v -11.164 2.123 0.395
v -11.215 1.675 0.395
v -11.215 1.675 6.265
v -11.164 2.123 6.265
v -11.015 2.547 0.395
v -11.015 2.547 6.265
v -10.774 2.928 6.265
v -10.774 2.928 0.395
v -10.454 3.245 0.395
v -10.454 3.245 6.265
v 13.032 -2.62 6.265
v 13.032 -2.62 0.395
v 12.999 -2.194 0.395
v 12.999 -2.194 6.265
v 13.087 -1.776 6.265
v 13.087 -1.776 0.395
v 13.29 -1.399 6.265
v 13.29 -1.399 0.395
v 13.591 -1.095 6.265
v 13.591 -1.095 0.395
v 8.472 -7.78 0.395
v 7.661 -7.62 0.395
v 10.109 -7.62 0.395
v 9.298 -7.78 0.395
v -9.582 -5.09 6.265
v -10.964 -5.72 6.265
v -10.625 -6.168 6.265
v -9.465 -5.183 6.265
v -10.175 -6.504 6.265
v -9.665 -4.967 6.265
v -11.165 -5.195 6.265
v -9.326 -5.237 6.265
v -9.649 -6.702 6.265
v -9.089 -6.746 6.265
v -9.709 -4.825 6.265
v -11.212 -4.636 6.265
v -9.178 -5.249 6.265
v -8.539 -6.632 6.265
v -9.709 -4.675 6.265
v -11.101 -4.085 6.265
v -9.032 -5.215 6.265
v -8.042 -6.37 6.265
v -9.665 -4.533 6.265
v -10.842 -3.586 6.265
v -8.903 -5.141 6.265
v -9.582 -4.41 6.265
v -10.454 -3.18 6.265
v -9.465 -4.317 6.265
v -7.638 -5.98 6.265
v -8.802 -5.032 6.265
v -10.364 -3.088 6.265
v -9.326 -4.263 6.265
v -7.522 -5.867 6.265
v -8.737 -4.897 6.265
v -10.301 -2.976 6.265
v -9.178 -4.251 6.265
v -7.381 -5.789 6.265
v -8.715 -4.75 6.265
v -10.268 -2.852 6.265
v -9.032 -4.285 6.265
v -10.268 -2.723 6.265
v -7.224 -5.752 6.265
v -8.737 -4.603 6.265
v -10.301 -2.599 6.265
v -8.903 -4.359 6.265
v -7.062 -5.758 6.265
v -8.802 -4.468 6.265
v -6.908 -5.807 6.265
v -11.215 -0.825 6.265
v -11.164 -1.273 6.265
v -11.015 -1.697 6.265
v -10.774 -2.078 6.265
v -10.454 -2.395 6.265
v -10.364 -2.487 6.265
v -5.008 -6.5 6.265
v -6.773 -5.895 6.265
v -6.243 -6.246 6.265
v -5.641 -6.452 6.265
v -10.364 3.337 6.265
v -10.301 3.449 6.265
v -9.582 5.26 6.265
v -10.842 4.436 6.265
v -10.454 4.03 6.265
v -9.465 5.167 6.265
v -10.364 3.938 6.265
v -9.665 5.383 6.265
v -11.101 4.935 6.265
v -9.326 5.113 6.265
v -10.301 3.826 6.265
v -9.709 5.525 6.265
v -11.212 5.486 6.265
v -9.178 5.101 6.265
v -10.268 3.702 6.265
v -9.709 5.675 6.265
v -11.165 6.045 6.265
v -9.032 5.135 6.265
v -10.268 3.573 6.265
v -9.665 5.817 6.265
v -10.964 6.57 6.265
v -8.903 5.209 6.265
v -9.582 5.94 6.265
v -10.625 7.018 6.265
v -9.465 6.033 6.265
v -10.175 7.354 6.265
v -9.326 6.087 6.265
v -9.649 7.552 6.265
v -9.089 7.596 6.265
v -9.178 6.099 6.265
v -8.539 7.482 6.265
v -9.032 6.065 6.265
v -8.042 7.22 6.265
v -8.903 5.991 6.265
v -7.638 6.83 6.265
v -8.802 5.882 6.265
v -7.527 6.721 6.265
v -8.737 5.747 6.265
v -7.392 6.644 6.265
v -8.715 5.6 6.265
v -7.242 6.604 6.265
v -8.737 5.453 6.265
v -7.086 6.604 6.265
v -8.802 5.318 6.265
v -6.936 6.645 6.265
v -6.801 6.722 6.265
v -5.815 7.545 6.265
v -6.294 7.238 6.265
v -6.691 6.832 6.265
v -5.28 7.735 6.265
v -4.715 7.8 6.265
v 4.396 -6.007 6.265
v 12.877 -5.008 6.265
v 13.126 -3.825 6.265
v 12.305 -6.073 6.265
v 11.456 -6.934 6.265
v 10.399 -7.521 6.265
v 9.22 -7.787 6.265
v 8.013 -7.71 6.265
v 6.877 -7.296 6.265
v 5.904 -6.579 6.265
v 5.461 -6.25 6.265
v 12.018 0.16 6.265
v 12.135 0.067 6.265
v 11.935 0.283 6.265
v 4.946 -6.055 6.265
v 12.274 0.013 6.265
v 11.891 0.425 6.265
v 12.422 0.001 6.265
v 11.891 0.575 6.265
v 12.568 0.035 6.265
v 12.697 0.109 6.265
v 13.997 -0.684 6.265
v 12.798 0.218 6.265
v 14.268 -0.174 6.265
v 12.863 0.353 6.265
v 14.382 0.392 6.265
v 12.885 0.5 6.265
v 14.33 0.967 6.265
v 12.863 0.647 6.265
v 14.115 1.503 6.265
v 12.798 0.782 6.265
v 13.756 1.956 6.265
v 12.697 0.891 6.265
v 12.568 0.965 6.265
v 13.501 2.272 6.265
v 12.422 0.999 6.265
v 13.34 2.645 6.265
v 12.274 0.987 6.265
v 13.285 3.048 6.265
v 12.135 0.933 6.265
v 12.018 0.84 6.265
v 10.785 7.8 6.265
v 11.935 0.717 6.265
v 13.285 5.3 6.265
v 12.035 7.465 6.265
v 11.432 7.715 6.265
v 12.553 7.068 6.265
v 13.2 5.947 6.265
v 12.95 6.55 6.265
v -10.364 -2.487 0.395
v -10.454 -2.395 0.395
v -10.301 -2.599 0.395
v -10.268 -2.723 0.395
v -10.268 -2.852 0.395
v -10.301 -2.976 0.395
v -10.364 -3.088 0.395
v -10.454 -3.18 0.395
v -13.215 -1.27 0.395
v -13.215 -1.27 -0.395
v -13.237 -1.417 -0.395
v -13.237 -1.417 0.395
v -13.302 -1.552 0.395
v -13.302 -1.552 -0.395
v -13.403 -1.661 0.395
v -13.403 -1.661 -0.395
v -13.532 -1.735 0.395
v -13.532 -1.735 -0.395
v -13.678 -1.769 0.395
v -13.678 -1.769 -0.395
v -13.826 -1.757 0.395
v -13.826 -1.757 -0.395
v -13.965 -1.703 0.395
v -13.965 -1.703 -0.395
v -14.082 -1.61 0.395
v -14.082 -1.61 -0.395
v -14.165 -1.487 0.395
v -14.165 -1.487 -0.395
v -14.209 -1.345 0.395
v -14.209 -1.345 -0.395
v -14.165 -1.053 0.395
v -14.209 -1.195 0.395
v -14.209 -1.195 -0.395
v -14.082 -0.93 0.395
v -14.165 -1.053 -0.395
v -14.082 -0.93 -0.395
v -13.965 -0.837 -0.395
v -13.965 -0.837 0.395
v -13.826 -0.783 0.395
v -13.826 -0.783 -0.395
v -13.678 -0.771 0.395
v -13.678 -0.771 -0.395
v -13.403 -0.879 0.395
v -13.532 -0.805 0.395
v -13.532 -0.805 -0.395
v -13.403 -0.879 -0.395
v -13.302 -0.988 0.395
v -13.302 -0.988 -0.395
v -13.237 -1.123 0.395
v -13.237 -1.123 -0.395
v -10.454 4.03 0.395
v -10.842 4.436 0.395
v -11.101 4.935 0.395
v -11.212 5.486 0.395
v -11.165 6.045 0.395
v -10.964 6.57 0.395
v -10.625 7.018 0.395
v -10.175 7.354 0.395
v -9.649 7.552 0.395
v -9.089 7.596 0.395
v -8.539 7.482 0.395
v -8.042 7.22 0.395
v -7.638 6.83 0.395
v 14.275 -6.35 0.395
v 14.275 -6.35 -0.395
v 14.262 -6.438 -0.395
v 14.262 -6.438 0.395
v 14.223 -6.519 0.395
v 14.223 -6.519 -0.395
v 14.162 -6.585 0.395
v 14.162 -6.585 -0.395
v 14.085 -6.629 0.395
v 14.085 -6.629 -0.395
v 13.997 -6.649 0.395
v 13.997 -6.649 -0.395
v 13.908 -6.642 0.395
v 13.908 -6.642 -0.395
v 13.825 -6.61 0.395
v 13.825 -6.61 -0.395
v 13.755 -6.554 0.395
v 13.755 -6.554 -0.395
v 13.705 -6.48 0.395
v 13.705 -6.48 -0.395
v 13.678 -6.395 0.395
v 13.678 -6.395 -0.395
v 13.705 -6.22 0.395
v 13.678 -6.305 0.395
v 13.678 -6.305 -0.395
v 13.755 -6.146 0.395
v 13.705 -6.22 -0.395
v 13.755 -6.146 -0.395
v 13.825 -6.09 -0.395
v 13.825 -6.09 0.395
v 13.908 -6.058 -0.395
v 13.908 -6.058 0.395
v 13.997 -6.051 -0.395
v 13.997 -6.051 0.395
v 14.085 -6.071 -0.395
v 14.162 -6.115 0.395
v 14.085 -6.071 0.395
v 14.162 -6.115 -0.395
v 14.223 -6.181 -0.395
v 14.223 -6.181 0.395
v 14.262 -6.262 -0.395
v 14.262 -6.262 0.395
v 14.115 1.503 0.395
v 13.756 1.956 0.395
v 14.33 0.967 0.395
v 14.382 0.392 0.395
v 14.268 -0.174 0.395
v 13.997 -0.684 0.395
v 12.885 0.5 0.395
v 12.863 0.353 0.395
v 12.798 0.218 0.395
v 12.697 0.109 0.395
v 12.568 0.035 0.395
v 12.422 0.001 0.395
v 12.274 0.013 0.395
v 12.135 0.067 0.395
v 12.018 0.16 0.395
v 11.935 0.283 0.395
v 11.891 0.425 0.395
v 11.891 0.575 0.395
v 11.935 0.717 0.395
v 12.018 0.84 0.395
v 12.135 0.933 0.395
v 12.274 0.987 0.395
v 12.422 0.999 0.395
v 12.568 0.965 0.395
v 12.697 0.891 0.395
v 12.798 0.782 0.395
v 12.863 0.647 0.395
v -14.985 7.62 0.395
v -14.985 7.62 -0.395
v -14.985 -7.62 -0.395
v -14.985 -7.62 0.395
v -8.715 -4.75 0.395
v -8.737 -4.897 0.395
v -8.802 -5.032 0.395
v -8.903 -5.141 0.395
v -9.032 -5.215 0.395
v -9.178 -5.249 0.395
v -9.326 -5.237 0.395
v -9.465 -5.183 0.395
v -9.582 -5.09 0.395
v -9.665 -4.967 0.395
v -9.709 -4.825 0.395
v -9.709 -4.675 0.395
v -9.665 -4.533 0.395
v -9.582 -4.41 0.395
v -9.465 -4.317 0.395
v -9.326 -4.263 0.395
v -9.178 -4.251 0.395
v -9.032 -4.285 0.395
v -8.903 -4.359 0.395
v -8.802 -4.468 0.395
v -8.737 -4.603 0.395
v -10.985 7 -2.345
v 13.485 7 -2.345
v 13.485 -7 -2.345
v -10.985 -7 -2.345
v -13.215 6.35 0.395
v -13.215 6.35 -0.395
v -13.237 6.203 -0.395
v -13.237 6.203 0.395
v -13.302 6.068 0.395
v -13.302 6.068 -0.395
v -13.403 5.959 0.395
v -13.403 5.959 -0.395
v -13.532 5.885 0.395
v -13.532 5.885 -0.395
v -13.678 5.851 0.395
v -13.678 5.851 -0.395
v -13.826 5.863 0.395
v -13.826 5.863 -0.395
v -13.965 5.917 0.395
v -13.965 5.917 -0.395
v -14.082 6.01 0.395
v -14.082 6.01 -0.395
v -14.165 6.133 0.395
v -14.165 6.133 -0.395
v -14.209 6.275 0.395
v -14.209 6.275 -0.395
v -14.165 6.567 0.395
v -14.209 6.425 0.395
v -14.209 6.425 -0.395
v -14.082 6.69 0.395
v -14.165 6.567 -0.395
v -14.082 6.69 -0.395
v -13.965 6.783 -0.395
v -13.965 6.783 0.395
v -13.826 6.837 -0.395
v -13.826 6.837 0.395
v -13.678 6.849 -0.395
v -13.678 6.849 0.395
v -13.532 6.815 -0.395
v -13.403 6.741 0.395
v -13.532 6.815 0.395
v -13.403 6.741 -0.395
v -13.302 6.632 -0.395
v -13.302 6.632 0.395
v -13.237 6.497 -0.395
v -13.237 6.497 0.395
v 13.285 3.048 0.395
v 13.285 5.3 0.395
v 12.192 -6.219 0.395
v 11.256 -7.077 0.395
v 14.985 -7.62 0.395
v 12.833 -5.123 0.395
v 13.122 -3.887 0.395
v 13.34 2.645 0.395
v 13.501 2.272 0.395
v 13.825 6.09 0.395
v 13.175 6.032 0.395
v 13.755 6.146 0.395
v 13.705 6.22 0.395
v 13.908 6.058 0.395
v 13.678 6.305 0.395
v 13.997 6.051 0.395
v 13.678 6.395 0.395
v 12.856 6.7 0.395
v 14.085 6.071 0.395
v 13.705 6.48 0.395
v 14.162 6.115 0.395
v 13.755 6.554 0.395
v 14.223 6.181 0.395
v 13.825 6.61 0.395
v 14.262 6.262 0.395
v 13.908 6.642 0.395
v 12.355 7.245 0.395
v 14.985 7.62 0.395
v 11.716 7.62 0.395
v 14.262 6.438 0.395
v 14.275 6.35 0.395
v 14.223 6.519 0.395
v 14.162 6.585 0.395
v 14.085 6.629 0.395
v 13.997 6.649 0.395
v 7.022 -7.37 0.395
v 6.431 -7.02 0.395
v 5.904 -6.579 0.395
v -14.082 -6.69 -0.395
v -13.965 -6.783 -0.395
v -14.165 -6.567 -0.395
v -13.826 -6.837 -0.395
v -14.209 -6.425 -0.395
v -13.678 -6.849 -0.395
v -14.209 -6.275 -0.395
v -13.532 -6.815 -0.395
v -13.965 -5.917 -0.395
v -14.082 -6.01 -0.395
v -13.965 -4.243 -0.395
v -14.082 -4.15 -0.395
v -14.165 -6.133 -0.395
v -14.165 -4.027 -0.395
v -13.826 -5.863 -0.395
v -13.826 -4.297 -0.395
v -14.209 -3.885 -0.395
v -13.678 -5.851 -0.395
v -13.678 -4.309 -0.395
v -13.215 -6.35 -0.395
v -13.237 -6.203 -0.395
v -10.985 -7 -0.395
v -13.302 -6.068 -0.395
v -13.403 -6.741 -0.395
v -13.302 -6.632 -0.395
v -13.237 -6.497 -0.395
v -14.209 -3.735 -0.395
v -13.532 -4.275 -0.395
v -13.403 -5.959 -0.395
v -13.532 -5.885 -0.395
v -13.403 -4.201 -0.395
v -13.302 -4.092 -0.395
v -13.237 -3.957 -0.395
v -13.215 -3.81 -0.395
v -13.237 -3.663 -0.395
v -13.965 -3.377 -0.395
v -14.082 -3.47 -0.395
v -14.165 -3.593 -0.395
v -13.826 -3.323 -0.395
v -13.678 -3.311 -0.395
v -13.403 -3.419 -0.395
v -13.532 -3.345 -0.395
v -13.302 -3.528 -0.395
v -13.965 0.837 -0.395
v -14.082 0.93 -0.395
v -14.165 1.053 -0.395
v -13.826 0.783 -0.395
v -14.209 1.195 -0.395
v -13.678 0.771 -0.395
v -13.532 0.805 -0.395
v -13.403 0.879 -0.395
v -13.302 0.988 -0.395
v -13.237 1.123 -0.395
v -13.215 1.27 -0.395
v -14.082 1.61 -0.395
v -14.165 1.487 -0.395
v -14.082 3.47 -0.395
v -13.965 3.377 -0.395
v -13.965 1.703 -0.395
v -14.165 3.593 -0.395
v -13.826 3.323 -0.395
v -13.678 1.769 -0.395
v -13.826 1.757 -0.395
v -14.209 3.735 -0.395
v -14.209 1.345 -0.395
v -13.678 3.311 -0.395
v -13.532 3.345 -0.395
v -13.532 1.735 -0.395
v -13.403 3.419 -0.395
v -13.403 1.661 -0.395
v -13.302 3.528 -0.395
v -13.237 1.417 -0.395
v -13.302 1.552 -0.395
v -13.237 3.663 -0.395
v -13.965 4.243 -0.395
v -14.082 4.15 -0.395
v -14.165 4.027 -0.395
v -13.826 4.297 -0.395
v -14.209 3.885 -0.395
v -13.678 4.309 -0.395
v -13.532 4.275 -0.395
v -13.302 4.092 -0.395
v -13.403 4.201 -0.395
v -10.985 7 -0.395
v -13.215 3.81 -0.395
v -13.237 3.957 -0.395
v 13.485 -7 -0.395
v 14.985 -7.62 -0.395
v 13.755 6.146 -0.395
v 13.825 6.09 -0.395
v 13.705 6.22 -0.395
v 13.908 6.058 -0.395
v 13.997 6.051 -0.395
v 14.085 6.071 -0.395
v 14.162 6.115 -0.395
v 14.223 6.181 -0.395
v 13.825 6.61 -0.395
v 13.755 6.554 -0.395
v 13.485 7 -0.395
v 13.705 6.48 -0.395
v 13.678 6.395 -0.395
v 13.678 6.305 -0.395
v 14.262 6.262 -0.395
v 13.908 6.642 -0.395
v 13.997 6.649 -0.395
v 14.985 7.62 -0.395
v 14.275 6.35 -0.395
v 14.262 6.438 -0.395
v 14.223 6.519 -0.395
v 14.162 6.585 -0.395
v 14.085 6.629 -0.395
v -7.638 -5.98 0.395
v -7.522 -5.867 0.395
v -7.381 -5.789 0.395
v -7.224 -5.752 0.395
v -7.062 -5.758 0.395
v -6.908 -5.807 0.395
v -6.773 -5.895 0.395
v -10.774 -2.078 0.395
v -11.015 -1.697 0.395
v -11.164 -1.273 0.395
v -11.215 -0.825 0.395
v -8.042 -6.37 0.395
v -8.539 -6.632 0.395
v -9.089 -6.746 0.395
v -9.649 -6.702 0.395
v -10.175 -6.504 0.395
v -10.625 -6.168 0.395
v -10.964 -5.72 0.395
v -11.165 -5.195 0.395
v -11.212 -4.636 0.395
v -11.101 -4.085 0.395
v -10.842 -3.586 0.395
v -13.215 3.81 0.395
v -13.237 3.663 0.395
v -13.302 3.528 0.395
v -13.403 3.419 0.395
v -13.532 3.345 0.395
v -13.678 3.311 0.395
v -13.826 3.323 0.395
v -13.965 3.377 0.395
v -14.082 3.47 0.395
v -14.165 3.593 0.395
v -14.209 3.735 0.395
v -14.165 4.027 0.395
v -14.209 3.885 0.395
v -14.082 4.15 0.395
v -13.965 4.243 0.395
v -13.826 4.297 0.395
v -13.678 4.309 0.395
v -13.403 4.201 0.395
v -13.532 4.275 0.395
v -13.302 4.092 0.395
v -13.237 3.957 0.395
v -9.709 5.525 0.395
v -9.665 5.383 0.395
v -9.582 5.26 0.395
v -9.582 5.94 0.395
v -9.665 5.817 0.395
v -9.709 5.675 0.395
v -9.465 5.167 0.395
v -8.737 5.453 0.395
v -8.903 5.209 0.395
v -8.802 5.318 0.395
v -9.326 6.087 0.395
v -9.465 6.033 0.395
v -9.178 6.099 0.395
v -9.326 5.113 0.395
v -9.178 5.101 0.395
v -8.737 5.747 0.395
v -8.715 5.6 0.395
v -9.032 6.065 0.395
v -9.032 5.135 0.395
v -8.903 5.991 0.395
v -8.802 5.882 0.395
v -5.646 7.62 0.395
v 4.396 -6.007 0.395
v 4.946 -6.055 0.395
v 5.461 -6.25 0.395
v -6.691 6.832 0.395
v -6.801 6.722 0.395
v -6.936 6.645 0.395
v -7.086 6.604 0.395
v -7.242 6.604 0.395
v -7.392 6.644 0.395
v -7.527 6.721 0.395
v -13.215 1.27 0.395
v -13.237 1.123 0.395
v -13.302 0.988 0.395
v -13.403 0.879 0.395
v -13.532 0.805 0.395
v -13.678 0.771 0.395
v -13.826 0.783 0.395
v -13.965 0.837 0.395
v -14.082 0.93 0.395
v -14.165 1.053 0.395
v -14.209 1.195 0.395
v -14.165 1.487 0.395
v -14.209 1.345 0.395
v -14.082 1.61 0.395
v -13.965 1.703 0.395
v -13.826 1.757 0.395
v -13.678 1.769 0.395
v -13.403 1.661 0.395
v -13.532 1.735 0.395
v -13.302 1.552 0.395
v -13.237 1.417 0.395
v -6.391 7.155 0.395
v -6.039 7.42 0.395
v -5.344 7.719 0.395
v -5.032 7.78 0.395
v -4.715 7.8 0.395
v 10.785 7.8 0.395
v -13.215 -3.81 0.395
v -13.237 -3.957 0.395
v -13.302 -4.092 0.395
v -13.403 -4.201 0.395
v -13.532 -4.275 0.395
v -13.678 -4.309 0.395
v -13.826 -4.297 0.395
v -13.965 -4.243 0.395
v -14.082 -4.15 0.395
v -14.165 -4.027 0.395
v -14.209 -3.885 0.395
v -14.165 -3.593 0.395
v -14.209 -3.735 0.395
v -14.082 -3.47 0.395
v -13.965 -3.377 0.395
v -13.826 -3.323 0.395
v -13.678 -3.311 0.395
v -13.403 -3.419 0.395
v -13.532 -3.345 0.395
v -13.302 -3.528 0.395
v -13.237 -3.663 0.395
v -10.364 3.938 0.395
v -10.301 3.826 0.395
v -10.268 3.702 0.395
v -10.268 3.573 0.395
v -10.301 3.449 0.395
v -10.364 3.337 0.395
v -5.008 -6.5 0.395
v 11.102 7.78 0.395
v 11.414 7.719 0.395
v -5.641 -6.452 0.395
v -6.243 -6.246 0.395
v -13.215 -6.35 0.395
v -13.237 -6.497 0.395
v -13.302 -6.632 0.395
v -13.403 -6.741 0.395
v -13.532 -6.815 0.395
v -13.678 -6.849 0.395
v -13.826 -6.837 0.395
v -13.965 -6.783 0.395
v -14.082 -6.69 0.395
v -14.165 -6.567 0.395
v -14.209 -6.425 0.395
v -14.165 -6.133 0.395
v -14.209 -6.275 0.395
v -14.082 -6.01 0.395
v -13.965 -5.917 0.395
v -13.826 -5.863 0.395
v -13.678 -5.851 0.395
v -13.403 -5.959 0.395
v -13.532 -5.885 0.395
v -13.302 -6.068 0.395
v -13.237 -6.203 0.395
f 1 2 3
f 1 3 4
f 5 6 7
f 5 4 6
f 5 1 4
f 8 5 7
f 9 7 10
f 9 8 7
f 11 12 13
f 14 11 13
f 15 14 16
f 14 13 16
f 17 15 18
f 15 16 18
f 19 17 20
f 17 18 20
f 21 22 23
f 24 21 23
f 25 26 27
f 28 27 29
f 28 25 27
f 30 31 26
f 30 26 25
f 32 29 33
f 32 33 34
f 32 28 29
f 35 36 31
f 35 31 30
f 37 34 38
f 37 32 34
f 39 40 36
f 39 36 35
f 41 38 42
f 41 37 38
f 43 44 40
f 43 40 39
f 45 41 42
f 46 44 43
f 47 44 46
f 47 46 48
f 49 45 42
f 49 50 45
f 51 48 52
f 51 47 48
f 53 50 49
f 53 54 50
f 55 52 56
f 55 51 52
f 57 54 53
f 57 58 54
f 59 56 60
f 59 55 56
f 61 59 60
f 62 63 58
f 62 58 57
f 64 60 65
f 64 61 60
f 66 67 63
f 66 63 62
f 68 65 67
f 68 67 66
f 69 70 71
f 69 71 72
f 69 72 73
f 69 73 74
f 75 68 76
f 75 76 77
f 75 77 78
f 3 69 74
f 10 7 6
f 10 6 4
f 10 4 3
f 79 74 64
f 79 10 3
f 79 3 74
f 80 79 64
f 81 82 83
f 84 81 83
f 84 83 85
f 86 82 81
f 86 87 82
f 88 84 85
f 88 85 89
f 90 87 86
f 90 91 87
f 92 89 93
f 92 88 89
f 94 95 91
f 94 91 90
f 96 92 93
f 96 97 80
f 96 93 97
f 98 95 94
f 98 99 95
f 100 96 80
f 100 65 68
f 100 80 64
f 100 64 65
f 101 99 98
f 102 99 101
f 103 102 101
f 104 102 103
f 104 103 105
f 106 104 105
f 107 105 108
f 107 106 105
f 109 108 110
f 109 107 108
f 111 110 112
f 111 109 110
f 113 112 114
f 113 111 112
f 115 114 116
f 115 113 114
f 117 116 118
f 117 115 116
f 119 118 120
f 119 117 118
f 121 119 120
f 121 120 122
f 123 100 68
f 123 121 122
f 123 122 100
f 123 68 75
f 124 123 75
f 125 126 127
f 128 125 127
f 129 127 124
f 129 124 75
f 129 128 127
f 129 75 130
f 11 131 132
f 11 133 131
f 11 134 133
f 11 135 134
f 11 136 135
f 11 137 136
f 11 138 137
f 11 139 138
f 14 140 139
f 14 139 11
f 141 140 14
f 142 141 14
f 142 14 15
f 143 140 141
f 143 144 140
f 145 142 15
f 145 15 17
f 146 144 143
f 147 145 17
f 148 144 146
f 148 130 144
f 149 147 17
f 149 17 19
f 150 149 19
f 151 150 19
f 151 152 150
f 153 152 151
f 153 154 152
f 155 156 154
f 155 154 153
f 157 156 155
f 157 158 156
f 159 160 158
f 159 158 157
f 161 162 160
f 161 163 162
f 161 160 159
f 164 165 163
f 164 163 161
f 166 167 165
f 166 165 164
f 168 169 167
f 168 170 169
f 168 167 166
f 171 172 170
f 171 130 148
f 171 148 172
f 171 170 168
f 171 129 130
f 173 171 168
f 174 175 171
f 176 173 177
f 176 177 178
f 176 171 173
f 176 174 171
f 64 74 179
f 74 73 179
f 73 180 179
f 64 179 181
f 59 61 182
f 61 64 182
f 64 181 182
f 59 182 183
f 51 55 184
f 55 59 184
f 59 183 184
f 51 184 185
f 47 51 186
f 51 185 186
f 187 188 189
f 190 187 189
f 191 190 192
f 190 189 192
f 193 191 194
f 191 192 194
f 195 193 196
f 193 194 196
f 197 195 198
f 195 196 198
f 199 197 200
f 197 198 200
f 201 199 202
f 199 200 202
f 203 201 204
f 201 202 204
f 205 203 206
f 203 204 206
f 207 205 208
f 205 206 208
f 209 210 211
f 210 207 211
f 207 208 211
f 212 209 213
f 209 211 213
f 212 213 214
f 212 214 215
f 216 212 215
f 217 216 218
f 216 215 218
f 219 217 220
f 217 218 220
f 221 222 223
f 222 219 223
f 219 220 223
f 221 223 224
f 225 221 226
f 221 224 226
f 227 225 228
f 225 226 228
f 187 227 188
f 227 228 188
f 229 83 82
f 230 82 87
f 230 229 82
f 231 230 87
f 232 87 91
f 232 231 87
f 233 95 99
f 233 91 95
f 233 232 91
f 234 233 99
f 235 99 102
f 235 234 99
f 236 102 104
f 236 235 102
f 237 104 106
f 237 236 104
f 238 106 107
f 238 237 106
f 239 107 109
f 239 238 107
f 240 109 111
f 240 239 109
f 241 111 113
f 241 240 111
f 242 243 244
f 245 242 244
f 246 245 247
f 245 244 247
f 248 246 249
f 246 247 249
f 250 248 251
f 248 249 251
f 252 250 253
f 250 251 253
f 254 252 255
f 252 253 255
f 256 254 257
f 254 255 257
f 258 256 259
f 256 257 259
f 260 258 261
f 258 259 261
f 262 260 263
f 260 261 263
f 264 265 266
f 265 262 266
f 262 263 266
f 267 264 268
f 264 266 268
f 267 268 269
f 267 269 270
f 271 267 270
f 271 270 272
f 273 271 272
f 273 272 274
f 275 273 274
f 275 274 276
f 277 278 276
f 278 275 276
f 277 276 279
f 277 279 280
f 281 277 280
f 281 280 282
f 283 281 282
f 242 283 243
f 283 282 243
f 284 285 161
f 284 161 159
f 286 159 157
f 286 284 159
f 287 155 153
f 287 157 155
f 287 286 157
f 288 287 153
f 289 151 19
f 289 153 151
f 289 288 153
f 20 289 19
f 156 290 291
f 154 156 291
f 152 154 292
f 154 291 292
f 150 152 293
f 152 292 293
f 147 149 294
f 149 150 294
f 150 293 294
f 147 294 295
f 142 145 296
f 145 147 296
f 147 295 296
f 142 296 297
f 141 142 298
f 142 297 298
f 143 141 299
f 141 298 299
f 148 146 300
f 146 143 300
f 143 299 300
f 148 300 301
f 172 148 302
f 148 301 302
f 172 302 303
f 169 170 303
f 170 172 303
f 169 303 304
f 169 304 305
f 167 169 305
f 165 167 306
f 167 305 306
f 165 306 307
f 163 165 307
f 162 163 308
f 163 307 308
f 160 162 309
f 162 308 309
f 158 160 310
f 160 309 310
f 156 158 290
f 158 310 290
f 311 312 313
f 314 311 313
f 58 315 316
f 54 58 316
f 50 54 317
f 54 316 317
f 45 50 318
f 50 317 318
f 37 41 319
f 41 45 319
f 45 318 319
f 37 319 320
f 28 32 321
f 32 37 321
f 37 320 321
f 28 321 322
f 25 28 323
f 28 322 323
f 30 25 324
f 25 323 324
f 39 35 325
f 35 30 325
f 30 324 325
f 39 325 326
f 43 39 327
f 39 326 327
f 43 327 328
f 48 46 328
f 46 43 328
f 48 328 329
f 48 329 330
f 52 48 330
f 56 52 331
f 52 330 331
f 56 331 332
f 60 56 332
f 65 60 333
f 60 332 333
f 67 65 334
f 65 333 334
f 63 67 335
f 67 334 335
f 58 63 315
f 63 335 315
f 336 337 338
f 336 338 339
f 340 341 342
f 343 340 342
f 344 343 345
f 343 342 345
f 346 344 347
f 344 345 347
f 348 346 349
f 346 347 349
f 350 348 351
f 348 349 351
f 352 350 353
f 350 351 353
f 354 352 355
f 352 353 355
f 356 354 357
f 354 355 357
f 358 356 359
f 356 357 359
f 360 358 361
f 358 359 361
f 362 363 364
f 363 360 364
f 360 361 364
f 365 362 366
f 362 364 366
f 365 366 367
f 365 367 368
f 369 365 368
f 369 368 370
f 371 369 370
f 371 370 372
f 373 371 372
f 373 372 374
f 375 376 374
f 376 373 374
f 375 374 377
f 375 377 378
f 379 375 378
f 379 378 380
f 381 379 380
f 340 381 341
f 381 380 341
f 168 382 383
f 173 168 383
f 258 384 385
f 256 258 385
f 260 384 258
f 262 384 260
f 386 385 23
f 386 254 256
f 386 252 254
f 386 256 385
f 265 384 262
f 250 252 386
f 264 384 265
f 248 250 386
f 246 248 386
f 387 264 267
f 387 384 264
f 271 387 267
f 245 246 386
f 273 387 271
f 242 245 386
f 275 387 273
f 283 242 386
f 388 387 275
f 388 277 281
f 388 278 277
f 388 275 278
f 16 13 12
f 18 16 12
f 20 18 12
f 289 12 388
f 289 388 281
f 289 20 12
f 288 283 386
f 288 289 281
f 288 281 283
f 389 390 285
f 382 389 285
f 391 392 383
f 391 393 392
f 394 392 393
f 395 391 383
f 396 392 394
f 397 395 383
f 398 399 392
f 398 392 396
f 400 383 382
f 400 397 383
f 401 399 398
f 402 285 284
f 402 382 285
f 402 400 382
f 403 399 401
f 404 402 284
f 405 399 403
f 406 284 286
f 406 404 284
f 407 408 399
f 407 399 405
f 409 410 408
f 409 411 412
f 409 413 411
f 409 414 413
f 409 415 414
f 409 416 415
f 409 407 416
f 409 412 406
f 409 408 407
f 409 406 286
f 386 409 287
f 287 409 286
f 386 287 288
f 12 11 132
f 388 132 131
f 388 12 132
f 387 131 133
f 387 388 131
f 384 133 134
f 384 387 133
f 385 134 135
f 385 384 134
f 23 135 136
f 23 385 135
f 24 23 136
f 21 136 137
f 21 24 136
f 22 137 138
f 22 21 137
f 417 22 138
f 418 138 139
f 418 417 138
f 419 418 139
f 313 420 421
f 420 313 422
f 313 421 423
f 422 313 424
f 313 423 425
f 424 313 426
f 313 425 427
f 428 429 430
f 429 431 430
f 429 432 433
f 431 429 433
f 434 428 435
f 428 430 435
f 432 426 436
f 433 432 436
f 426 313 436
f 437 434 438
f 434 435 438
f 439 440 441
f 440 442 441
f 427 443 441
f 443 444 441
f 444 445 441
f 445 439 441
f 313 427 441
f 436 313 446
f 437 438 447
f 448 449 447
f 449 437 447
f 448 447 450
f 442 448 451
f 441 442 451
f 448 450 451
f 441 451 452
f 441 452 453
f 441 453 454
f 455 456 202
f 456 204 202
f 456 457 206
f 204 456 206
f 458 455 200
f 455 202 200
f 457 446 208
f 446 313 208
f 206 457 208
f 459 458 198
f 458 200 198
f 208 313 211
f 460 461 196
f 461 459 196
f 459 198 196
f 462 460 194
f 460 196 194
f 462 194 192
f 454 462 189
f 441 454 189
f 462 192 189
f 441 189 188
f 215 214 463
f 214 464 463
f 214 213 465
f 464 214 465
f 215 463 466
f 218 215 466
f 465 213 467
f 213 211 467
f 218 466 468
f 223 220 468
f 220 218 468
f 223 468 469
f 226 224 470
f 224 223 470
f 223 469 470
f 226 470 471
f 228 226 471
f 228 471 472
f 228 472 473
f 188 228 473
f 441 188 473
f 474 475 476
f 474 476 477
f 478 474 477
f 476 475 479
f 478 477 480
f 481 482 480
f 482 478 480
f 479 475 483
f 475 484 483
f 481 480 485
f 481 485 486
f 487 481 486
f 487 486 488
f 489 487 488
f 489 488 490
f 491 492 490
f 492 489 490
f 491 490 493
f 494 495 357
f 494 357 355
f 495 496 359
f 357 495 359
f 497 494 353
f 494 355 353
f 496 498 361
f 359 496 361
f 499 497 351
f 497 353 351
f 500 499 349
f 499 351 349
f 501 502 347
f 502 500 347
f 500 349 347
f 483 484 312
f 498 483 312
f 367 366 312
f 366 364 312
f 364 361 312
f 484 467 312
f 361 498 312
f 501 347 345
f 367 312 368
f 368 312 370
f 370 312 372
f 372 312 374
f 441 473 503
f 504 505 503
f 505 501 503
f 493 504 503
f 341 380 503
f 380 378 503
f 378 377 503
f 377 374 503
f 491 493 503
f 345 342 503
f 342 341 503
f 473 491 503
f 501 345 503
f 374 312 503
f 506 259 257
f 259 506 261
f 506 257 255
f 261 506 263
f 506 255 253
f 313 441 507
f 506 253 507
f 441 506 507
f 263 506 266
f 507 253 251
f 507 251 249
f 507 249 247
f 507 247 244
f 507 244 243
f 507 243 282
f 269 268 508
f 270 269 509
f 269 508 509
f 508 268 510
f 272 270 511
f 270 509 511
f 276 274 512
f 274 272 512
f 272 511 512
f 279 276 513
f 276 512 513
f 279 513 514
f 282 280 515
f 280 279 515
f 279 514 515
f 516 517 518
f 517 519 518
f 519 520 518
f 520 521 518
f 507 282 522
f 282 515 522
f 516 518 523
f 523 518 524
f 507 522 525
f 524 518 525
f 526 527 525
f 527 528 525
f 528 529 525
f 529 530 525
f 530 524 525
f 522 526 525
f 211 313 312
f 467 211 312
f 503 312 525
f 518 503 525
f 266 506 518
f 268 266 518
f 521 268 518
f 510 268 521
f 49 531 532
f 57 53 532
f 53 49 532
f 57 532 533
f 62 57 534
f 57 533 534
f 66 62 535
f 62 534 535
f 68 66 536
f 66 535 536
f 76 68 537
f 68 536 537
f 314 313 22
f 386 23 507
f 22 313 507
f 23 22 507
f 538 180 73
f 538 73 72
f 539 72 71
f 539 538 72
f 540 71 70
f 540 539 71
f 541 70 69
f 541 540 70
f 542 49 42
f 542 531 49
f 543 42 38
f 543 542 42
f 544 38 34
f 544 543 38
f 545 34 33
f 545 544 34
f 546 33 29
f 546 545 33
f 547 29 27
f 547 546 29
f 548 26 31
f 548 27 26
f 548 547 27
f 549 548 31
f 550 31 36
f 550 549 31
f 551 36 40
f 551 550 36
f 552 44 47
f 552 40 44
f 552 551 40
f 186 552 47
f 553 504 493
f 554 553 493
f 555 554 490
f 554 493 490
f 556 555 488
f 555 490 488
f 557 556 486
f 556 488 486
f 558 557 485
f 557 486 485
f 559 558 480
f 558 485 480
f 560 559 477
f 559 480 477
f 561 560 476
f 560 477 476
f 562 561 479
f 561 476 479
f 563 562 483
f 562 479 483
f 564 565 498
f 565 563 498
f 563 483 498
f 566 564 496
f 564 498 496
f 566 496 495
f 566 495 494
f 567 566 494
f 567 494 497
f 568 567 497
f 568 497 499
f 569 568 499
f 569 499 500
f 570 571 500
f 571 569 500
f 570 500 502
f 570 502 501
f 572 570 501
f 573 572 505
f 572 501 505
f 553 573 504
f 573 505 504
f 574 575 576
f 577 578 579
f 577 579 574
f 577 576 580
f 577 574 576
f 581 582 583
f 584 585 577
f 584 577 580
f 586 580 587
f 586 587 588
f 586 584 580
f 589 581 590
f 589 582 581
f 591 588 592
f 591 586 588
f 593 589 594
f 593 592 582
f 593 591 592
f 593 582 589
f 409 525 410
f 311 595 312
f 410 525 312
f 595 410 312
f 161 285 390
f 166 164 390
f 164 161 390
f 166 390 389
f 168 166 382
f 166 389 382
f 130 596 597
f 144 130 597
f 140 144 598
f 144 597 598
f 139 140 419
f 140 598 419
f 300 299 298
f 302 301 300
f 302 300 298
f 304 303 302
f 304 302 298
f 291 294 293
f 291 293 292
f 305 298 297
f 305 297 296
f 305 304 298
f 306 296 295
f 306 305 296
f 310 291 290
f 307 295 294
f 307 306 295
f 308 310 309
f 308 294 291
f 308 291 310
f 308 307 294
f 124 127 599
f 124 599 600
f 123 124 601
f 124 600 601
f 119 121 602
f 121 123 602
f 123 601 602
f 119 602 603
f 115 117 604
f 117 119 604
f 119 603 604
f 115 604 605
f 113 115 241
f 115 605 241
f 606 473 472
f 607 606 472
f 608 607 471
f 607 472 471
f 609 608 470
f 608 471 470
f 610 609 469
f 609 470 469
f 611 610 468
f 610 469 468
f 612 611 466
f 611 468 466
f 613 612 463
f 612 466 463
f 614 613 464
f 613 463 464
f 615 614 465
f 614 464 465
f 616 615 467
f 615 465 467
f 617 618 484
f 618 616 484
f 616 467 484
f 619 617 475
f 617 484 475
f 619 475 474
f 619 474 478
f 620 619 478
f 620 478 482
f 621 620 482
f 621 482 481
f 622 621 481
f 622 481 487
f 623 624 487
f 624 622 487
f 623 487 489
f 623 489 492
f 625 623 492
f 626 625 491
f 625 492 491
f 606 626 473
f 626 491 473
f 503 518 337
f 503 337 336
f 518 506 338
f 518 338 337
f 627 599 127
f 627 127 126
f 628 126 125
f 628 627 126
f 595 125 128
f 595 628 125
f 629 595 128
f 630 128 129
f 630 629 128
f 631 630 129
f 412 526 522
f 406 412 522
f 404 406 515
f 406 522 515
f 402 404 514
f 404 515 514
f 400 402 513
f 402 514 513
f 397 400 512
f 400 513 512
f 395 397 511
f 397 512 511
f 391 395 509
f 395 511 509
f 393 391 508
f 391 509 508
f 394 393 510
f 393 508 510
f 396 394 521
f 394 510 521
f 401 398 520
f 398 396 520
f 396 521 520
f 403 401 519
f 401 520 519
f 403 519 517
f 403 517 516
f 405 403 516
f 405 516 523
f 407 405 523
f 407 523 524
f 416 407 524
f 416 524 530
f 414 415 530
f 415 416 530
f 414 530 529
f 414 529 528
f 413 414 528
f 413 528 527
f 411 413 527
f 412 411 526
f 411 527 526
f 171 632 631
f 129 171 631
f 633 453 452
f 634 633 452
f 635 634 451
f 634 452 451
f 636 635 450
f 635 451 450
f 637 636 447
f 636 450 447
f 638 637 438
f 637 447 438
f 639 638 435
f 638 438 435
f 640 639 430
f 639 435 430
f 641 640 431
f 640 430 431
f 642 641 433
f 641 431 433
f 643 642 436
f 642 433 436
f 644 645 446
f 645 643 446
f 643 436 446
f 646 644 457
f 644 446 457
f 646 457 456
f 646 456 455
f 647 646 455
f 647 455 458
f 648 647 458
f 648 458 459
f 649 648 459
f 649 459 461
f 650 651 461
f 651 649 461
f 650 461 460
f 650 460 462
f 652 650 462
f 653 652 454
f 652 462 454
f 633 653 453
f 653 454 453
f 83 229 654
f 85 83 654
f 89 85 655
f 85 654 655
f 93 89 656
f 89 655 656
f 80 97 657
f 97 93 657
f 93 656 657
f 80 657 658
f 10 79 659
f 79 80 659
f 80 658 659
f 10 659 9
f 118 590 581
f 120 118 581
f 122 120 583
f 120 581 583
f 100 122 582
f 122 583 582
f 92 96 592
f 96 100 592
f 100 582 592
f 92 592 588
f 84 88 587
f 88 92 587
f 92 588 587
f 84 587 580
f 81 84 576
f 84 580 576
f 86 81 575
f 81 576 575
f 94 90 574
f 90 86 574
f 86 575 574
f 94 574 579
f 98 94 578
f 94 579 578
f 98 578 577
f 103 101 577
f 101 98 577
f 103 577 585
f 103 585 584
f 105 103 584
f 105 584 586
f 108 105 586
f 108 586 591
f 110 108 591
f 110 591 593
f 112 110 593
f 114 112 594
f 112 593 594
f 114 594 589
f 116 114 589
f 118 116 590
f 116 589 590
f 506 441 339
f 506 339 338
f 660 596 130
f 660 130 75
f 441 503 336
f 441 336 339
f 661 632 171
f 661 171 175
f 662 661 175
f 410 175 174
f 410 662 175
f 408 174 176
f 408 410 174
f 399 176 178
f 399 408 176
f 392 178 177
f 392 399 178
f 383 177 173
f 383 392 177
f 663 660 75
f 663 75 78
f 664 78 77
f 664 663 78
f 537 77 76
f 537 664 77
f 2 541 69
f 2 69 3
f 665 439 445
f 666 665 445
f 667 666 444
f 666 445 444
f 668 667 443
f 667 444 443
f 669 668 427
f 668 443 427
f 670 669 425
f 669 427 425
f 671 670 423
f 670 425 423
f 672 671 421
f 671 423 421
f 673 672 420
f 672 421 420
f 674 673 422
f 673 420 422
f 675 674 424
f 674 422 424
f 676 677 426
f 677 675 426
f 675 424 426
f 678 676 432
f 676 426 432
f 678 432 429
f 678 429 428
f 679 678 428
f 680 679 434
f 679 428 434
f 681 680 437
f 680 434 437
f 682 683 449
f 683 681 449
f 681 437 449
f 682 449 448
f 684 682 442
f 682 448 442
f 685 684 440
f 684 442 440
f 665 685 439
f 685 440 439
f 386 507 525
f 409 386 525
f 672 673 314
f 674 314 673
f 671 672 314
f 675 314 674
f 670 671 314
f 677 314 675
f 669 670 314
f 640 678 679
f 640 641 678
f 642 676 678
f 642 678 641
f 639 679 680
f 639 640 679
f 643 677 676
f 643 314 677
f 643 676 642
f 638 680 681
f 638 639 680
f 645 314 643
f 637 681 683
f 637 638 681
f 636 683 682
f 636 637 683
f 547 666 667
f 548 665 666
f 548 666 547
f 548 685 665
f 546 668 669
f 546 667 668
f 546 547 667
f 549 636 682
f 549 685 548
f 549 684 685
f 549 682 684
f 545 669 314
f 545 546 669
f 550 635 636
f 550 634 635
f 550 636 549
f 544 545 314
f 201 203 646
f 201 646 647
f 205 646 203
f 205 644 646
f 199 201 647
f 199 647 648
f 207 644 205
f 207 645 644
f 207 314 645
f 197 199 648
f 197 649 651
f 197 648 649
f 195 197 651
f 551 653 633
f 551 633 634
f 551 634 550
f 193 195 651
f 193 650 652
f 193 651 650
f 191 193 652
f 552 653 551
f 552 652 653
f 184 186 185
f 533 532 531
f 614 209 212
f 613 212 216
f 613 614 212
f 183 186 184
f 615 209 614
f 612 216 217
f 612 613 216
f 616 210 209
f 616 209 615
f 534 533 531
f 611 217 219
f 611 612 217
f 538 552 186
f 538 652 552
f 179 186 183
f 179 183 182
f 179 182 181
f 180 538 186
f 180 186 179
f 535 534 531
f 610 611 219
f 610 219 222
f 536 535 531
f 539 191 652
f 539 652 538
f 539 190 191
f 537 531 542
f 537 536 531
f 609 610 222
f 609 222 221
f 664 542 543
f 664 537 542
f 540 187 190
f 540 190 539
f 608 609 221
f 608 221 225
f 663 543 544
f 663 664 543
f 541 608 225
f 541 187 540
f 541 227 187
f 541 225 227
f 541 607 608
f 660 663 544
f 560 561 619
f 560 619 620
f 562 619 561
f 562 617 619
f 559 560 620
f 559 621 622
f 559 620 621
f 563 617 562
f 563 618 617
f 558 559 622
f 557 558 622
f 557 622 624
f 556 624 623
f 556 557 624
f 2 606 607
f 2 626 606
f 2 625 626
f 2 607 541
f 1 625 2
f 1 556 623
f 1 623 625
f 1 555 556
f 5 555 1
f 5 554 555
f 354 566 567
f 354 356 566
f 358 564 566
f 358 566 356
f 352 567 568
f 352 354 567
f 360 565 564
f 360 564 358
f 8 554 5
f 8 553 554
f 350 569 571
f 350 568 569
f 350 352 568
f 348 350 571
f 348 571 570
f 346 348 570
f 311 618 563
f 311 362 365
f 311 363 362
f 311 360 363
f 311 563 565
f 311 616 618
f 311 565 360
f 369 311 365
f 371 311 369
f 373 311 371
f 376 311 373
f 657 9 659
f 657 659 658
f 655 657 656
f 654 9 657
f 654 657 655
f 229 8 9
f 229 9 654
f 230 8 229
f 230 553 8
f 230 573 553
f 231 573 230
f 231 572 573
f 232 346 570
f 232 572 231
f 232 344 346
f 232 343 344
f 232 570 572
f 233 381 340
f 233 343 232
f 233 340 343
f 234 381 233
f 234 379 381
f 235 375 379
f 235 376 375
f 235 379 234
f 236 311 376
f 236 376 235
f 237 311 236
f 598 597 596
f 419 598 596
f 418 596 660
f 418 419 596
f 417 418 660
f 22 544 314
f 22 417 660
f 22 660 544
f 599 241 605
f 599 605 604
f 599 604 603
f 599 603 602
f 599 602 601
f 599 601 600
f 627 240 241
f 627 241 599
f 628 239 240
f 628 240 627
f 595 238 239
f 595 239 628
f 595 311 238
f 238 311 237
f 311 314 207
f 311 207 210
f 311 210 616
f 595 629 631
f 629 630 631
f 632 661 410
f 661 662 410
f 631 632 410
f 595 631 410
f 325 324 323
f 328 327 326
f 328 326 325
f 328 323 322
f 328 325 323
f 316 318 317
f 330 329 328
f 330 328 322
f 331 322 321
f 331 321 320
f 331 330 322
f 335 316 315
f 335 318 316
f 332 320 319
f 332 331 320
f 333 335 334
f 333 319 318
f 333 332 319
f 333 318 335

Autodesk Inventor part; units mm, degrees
ref_plane "YZ Plane" through (0, 0, 0) normal (1, 0, 0) x (0, 1, 0)
ref_plane "XZ Plane" through (0, 0, 0) normal (0, 1, 0) x (-1, 0, 0)
ref_plane "XY Plane" through (0, 0, 0) normal (0, 0, 1) x (1, 0, 0)
sketch "Sketch1" plane through (0, 0, 0) normal (0, 0, 1) x (1, 0, 0)
  line L0 (-14.985, -7.62) -> (14.985, -7.62)
  line L1 (14.985, -7.62) -> (14.985, 7.62)
  line L2 (14.985, 7.62) -> (-14.985, 7.62)
  line L3 (-14.985, 7.62) -> (-14.985, -7.62)
  line L4 (-14.985, -7.62) -> (14.985, 7.62) construction
  line L5 (14.985, -7.62) -> (-14.985, 7.62) construction
  circle A0 centre (-13.715, 6.35) radius 0.5
  circle A1 centre (-13.715, 3.81) radius 0.5
  circle A2 centre (-13.715, 1.27) radius 0.5
  circle A3 centre (-13.715, -1.27) radius 0.5
  circle A4 centre (-13.715, -3.81) radius 0.5
  circle A5 centre (-13.715, -6.35) radius 0.5
  circle A6 centre (13.975, 6.35) radius 0.3
  circle A7 centre (13.975, -6.35) radius 0.3
  point P0 (0, 0)
  dimension "d0" = 29.97
  dimension "d1" = 15.24
  dimension "d2" = 1
  dimension "d3" = 1.27
  dimension "d4" = 1.27
  dimension "d7" = 2.54
  dimension "d12" = 0.6
  dimension "d13" = 28.96
extrude "Extrusion1" add sketch "Sketch1" along normal mid plane 0.79
sketch "Sketch2" plane through (0, 0, -0.395) normal (0, 0, -1) x (-1, 0, 0)
  circle A0 centre (13.715, -6.35) radius 0.5 projected
  circle A1 centre (13.715, -3.81) radius 0.5 projected
  circle A2 centre (13.715, -1.27) radius 0.5 projected
  circle A3 centre (13.715, 1.27) radius 0.5 projected
  circle A4 centre (13.715, 3.81) radius 0.5 projected
  circle A5 centre (13.715, 6.35) radius 0.5 projected
  circle A6 centre (-13.975, -6.35) radius 0.3 projected
  circle A7 centre (-13.975, 6.35) radius 0.3 projected
  line L0 (-14.985, -7.62) -> (14.985, -7.62) projected
  line L1 (14.985, -7.62) -> (14.985, 7.62) projected
  line L2 (14.985, 7.62) -> (-14.985, 7.62) projected
  line L3 (-14.985, 7.62) -> (-14.985, -7.62) projected
  line L4 (-13.485, 7) -> (10.985, 7)
  line L5 (10.985, 7) -> (10.985, -7)
  line L6 (10.985, -7) -> (-13.485, -7)
  line L7 (-13.485, -7) -> (-13.485, 7)
  point P0 (0, 0)
  point P1 (10.985, 0)
  dimension "d16" = 14
  dimension "d17" = 4
  dimension "d18" = 1.5
extrude "Extrusion2" add sketch "Sketch2" along normal blind 1.95 contours L4 L5 L6 L7
sketch "Sketch3" plane through (0, 0, 0.395) normal (0, 0, 1) x (1, 0, 0)
  circle A0 centre (-13.715, -6.35) radius 0.5 projected
  circle A1 centre (-13.715, -3.81) radius 0.5 projected
  circle A2 centre (-13.715, -1.27) radius 0.5 projected
  circle A3 centre (-13.715, 1.27) radius 0.5 projected
  circle A4 centre (-13.715, 3.81) radius 0.5 projected
  circle A5 centre (-13.715, 6.35) radius 0.5 projected
  circle A6 centre (13.975, -6.35) radius 0.3 projected
  circle A7 centre (13.975, 6.35) radius 0.3 projected
  line L0 (-14.985, -7.62) -> (14.985, -7.62) projected
  line L1 (14.985, -7.62) -> (14.985, 7.62) projected
  line L2 (14.985, 7.62) -> (-14.985, 7.62) projected
  line L3 (-14.985, 7.62) -> (-14.985, -7.62) projected
  line L4 (-14.985, 7.5559) -> (14.985, 7.5559) construction
  line L5 (14.985, 7.5559) -> (14.985, -7.62) construction
  line L6 (14.985, -7.62) -> (-14.985, -7.62) construction
  line L7 (-14.985, -7.62) -> (-14.985, 7.5559) construction
  line L8 (-14.985, 7.62) -> (-14.985, -7.62) projected
  arc A8 (13.285, 3.0475) -> (13.7564, 1.9557) centre (14.785, 3.0475) ccw
  arc A9 (13.5911, -1.0954) -> (13.7564, 1.9557) centre (12.385, 0.5) ccw
  arc A10 (13.5911, -1.0954) -> (13.032, -2.6201) centre (14.4957, -2.292) ccw
  arc A11 (5.9038, -6.579) -> (13.032, -2.6201) centre (8.885, -3.55) ccw
  arc A12 (5.9038, -6.579) -> (4.3962, -6.0072) centre (4.5009, -8.0044) ccw
  line L9 (4.3962, -6.0072) -> (-5.0076, -6.5)
  arc A13 (-6.7728, -5.8952) -> (-5.0076, -6.5) centre (-5.1385, -4.0034) ccw
  arc A14 (-6.7728, -5.8952) -> (-7.6381, -5.9802) centre (-7.165, -6.3493) ccw
  arc A15 (-10.454, -3.18) -> (-7.6381, -5.9802) centre (-9.215, -4.75) ccw
  arc A16 (-10.454, -3.18) -> (-10.454, -2.395) centre (-10.7637, -2.7875) ccw
  arc A17 (-11.215, -0.825) -> (-10.454, -2.395) centre (-9.215, -0.825) ccw
  line L10 (-11.215, -0.825) -> (-11.215, 1.675)
  arc A18 (-10.454, 3.245) -> (-11.215, 1.675) centre (-9.215, 1.675) ccw
  arc A19 (-10.454, 3.245) -> (-10.454, 4.03) centre (-10.7637, 3.6375) ccw
  arc A20 (-7.6381, 6.8302) -> (-10.454, 4.03) centre (-9.215, 5.6) ccw
  arc A21 (-7.6381, 6.8302) -> (-6.6908, 6.8317) centre (-7.165, 7.1993) ccw
  line L11 (13.285, 3.0475) -> (13.285, 5.3)
  arc A22 (13.285, 5.3) -> (10.785, 7.8) centre (10.785, 5.3) ccw
  line L12 (10.785, 7.8) -> (-4.715, 7.8)
  arc A23 (-4.715, 7.8) -> (-6.6908, 6.8317) centre (-4.715, 5.3) ccw
  circle A24 centre (-9.215, 5.6) radius 0.5
  circle A25 centre (-9.215, -4.75) radius 0.5
  circle A26 centre (12.385, 0.5) radius 0.5
  line L13 (8.885, -7.8) -> (8.885, 7.8) construction
  point P0 (0, 0)
  point P1 (8.885, 0)
  dimension "d29" = 7.8
  dimension "d32" = 4.5
  dimension "d33" = 2.5
  dimension "d34" = 26.1
  dimension "d35" = 24.5
  dimension "d36" = 5.6
  dimension "d37" = 4.75
  dimension "d38" = 2
  dimension "d44" = 2.5
  dimension "d46" = 0.5
  dimension "d49" = 2
  dimension "d52" = 0.6
  dimension "d53" = 2.5
  dimension "d54" = 4.5
  dimension "d57" = 2.5
  dimension "d59" = 0.5
  dimension "d61" = 2
  dimension "d64" = 1.5
  dimension "d65" = 1
  dimension "d73" = 20.1
  dimension "d77" = 4.25
  dimension "d78" = 3
  dimension "d80" = 2.5
  dimension "d82" = 6.5
  dimension "d84" = 2
extrude "Extrusion3" add sketch "Sketch3" along normal blind 5.87 contours A11 A12 L9 A13 A14 A15 A16 A17 L10 A18 A19 A20 A21 A23 L2 A22 L11 A8 A9 A10 L0 | L0 A11 | A23 L12 A22 L2
equation "\"d4\" = d3"
properties part number "66-0008" material "ABS Plastic"
